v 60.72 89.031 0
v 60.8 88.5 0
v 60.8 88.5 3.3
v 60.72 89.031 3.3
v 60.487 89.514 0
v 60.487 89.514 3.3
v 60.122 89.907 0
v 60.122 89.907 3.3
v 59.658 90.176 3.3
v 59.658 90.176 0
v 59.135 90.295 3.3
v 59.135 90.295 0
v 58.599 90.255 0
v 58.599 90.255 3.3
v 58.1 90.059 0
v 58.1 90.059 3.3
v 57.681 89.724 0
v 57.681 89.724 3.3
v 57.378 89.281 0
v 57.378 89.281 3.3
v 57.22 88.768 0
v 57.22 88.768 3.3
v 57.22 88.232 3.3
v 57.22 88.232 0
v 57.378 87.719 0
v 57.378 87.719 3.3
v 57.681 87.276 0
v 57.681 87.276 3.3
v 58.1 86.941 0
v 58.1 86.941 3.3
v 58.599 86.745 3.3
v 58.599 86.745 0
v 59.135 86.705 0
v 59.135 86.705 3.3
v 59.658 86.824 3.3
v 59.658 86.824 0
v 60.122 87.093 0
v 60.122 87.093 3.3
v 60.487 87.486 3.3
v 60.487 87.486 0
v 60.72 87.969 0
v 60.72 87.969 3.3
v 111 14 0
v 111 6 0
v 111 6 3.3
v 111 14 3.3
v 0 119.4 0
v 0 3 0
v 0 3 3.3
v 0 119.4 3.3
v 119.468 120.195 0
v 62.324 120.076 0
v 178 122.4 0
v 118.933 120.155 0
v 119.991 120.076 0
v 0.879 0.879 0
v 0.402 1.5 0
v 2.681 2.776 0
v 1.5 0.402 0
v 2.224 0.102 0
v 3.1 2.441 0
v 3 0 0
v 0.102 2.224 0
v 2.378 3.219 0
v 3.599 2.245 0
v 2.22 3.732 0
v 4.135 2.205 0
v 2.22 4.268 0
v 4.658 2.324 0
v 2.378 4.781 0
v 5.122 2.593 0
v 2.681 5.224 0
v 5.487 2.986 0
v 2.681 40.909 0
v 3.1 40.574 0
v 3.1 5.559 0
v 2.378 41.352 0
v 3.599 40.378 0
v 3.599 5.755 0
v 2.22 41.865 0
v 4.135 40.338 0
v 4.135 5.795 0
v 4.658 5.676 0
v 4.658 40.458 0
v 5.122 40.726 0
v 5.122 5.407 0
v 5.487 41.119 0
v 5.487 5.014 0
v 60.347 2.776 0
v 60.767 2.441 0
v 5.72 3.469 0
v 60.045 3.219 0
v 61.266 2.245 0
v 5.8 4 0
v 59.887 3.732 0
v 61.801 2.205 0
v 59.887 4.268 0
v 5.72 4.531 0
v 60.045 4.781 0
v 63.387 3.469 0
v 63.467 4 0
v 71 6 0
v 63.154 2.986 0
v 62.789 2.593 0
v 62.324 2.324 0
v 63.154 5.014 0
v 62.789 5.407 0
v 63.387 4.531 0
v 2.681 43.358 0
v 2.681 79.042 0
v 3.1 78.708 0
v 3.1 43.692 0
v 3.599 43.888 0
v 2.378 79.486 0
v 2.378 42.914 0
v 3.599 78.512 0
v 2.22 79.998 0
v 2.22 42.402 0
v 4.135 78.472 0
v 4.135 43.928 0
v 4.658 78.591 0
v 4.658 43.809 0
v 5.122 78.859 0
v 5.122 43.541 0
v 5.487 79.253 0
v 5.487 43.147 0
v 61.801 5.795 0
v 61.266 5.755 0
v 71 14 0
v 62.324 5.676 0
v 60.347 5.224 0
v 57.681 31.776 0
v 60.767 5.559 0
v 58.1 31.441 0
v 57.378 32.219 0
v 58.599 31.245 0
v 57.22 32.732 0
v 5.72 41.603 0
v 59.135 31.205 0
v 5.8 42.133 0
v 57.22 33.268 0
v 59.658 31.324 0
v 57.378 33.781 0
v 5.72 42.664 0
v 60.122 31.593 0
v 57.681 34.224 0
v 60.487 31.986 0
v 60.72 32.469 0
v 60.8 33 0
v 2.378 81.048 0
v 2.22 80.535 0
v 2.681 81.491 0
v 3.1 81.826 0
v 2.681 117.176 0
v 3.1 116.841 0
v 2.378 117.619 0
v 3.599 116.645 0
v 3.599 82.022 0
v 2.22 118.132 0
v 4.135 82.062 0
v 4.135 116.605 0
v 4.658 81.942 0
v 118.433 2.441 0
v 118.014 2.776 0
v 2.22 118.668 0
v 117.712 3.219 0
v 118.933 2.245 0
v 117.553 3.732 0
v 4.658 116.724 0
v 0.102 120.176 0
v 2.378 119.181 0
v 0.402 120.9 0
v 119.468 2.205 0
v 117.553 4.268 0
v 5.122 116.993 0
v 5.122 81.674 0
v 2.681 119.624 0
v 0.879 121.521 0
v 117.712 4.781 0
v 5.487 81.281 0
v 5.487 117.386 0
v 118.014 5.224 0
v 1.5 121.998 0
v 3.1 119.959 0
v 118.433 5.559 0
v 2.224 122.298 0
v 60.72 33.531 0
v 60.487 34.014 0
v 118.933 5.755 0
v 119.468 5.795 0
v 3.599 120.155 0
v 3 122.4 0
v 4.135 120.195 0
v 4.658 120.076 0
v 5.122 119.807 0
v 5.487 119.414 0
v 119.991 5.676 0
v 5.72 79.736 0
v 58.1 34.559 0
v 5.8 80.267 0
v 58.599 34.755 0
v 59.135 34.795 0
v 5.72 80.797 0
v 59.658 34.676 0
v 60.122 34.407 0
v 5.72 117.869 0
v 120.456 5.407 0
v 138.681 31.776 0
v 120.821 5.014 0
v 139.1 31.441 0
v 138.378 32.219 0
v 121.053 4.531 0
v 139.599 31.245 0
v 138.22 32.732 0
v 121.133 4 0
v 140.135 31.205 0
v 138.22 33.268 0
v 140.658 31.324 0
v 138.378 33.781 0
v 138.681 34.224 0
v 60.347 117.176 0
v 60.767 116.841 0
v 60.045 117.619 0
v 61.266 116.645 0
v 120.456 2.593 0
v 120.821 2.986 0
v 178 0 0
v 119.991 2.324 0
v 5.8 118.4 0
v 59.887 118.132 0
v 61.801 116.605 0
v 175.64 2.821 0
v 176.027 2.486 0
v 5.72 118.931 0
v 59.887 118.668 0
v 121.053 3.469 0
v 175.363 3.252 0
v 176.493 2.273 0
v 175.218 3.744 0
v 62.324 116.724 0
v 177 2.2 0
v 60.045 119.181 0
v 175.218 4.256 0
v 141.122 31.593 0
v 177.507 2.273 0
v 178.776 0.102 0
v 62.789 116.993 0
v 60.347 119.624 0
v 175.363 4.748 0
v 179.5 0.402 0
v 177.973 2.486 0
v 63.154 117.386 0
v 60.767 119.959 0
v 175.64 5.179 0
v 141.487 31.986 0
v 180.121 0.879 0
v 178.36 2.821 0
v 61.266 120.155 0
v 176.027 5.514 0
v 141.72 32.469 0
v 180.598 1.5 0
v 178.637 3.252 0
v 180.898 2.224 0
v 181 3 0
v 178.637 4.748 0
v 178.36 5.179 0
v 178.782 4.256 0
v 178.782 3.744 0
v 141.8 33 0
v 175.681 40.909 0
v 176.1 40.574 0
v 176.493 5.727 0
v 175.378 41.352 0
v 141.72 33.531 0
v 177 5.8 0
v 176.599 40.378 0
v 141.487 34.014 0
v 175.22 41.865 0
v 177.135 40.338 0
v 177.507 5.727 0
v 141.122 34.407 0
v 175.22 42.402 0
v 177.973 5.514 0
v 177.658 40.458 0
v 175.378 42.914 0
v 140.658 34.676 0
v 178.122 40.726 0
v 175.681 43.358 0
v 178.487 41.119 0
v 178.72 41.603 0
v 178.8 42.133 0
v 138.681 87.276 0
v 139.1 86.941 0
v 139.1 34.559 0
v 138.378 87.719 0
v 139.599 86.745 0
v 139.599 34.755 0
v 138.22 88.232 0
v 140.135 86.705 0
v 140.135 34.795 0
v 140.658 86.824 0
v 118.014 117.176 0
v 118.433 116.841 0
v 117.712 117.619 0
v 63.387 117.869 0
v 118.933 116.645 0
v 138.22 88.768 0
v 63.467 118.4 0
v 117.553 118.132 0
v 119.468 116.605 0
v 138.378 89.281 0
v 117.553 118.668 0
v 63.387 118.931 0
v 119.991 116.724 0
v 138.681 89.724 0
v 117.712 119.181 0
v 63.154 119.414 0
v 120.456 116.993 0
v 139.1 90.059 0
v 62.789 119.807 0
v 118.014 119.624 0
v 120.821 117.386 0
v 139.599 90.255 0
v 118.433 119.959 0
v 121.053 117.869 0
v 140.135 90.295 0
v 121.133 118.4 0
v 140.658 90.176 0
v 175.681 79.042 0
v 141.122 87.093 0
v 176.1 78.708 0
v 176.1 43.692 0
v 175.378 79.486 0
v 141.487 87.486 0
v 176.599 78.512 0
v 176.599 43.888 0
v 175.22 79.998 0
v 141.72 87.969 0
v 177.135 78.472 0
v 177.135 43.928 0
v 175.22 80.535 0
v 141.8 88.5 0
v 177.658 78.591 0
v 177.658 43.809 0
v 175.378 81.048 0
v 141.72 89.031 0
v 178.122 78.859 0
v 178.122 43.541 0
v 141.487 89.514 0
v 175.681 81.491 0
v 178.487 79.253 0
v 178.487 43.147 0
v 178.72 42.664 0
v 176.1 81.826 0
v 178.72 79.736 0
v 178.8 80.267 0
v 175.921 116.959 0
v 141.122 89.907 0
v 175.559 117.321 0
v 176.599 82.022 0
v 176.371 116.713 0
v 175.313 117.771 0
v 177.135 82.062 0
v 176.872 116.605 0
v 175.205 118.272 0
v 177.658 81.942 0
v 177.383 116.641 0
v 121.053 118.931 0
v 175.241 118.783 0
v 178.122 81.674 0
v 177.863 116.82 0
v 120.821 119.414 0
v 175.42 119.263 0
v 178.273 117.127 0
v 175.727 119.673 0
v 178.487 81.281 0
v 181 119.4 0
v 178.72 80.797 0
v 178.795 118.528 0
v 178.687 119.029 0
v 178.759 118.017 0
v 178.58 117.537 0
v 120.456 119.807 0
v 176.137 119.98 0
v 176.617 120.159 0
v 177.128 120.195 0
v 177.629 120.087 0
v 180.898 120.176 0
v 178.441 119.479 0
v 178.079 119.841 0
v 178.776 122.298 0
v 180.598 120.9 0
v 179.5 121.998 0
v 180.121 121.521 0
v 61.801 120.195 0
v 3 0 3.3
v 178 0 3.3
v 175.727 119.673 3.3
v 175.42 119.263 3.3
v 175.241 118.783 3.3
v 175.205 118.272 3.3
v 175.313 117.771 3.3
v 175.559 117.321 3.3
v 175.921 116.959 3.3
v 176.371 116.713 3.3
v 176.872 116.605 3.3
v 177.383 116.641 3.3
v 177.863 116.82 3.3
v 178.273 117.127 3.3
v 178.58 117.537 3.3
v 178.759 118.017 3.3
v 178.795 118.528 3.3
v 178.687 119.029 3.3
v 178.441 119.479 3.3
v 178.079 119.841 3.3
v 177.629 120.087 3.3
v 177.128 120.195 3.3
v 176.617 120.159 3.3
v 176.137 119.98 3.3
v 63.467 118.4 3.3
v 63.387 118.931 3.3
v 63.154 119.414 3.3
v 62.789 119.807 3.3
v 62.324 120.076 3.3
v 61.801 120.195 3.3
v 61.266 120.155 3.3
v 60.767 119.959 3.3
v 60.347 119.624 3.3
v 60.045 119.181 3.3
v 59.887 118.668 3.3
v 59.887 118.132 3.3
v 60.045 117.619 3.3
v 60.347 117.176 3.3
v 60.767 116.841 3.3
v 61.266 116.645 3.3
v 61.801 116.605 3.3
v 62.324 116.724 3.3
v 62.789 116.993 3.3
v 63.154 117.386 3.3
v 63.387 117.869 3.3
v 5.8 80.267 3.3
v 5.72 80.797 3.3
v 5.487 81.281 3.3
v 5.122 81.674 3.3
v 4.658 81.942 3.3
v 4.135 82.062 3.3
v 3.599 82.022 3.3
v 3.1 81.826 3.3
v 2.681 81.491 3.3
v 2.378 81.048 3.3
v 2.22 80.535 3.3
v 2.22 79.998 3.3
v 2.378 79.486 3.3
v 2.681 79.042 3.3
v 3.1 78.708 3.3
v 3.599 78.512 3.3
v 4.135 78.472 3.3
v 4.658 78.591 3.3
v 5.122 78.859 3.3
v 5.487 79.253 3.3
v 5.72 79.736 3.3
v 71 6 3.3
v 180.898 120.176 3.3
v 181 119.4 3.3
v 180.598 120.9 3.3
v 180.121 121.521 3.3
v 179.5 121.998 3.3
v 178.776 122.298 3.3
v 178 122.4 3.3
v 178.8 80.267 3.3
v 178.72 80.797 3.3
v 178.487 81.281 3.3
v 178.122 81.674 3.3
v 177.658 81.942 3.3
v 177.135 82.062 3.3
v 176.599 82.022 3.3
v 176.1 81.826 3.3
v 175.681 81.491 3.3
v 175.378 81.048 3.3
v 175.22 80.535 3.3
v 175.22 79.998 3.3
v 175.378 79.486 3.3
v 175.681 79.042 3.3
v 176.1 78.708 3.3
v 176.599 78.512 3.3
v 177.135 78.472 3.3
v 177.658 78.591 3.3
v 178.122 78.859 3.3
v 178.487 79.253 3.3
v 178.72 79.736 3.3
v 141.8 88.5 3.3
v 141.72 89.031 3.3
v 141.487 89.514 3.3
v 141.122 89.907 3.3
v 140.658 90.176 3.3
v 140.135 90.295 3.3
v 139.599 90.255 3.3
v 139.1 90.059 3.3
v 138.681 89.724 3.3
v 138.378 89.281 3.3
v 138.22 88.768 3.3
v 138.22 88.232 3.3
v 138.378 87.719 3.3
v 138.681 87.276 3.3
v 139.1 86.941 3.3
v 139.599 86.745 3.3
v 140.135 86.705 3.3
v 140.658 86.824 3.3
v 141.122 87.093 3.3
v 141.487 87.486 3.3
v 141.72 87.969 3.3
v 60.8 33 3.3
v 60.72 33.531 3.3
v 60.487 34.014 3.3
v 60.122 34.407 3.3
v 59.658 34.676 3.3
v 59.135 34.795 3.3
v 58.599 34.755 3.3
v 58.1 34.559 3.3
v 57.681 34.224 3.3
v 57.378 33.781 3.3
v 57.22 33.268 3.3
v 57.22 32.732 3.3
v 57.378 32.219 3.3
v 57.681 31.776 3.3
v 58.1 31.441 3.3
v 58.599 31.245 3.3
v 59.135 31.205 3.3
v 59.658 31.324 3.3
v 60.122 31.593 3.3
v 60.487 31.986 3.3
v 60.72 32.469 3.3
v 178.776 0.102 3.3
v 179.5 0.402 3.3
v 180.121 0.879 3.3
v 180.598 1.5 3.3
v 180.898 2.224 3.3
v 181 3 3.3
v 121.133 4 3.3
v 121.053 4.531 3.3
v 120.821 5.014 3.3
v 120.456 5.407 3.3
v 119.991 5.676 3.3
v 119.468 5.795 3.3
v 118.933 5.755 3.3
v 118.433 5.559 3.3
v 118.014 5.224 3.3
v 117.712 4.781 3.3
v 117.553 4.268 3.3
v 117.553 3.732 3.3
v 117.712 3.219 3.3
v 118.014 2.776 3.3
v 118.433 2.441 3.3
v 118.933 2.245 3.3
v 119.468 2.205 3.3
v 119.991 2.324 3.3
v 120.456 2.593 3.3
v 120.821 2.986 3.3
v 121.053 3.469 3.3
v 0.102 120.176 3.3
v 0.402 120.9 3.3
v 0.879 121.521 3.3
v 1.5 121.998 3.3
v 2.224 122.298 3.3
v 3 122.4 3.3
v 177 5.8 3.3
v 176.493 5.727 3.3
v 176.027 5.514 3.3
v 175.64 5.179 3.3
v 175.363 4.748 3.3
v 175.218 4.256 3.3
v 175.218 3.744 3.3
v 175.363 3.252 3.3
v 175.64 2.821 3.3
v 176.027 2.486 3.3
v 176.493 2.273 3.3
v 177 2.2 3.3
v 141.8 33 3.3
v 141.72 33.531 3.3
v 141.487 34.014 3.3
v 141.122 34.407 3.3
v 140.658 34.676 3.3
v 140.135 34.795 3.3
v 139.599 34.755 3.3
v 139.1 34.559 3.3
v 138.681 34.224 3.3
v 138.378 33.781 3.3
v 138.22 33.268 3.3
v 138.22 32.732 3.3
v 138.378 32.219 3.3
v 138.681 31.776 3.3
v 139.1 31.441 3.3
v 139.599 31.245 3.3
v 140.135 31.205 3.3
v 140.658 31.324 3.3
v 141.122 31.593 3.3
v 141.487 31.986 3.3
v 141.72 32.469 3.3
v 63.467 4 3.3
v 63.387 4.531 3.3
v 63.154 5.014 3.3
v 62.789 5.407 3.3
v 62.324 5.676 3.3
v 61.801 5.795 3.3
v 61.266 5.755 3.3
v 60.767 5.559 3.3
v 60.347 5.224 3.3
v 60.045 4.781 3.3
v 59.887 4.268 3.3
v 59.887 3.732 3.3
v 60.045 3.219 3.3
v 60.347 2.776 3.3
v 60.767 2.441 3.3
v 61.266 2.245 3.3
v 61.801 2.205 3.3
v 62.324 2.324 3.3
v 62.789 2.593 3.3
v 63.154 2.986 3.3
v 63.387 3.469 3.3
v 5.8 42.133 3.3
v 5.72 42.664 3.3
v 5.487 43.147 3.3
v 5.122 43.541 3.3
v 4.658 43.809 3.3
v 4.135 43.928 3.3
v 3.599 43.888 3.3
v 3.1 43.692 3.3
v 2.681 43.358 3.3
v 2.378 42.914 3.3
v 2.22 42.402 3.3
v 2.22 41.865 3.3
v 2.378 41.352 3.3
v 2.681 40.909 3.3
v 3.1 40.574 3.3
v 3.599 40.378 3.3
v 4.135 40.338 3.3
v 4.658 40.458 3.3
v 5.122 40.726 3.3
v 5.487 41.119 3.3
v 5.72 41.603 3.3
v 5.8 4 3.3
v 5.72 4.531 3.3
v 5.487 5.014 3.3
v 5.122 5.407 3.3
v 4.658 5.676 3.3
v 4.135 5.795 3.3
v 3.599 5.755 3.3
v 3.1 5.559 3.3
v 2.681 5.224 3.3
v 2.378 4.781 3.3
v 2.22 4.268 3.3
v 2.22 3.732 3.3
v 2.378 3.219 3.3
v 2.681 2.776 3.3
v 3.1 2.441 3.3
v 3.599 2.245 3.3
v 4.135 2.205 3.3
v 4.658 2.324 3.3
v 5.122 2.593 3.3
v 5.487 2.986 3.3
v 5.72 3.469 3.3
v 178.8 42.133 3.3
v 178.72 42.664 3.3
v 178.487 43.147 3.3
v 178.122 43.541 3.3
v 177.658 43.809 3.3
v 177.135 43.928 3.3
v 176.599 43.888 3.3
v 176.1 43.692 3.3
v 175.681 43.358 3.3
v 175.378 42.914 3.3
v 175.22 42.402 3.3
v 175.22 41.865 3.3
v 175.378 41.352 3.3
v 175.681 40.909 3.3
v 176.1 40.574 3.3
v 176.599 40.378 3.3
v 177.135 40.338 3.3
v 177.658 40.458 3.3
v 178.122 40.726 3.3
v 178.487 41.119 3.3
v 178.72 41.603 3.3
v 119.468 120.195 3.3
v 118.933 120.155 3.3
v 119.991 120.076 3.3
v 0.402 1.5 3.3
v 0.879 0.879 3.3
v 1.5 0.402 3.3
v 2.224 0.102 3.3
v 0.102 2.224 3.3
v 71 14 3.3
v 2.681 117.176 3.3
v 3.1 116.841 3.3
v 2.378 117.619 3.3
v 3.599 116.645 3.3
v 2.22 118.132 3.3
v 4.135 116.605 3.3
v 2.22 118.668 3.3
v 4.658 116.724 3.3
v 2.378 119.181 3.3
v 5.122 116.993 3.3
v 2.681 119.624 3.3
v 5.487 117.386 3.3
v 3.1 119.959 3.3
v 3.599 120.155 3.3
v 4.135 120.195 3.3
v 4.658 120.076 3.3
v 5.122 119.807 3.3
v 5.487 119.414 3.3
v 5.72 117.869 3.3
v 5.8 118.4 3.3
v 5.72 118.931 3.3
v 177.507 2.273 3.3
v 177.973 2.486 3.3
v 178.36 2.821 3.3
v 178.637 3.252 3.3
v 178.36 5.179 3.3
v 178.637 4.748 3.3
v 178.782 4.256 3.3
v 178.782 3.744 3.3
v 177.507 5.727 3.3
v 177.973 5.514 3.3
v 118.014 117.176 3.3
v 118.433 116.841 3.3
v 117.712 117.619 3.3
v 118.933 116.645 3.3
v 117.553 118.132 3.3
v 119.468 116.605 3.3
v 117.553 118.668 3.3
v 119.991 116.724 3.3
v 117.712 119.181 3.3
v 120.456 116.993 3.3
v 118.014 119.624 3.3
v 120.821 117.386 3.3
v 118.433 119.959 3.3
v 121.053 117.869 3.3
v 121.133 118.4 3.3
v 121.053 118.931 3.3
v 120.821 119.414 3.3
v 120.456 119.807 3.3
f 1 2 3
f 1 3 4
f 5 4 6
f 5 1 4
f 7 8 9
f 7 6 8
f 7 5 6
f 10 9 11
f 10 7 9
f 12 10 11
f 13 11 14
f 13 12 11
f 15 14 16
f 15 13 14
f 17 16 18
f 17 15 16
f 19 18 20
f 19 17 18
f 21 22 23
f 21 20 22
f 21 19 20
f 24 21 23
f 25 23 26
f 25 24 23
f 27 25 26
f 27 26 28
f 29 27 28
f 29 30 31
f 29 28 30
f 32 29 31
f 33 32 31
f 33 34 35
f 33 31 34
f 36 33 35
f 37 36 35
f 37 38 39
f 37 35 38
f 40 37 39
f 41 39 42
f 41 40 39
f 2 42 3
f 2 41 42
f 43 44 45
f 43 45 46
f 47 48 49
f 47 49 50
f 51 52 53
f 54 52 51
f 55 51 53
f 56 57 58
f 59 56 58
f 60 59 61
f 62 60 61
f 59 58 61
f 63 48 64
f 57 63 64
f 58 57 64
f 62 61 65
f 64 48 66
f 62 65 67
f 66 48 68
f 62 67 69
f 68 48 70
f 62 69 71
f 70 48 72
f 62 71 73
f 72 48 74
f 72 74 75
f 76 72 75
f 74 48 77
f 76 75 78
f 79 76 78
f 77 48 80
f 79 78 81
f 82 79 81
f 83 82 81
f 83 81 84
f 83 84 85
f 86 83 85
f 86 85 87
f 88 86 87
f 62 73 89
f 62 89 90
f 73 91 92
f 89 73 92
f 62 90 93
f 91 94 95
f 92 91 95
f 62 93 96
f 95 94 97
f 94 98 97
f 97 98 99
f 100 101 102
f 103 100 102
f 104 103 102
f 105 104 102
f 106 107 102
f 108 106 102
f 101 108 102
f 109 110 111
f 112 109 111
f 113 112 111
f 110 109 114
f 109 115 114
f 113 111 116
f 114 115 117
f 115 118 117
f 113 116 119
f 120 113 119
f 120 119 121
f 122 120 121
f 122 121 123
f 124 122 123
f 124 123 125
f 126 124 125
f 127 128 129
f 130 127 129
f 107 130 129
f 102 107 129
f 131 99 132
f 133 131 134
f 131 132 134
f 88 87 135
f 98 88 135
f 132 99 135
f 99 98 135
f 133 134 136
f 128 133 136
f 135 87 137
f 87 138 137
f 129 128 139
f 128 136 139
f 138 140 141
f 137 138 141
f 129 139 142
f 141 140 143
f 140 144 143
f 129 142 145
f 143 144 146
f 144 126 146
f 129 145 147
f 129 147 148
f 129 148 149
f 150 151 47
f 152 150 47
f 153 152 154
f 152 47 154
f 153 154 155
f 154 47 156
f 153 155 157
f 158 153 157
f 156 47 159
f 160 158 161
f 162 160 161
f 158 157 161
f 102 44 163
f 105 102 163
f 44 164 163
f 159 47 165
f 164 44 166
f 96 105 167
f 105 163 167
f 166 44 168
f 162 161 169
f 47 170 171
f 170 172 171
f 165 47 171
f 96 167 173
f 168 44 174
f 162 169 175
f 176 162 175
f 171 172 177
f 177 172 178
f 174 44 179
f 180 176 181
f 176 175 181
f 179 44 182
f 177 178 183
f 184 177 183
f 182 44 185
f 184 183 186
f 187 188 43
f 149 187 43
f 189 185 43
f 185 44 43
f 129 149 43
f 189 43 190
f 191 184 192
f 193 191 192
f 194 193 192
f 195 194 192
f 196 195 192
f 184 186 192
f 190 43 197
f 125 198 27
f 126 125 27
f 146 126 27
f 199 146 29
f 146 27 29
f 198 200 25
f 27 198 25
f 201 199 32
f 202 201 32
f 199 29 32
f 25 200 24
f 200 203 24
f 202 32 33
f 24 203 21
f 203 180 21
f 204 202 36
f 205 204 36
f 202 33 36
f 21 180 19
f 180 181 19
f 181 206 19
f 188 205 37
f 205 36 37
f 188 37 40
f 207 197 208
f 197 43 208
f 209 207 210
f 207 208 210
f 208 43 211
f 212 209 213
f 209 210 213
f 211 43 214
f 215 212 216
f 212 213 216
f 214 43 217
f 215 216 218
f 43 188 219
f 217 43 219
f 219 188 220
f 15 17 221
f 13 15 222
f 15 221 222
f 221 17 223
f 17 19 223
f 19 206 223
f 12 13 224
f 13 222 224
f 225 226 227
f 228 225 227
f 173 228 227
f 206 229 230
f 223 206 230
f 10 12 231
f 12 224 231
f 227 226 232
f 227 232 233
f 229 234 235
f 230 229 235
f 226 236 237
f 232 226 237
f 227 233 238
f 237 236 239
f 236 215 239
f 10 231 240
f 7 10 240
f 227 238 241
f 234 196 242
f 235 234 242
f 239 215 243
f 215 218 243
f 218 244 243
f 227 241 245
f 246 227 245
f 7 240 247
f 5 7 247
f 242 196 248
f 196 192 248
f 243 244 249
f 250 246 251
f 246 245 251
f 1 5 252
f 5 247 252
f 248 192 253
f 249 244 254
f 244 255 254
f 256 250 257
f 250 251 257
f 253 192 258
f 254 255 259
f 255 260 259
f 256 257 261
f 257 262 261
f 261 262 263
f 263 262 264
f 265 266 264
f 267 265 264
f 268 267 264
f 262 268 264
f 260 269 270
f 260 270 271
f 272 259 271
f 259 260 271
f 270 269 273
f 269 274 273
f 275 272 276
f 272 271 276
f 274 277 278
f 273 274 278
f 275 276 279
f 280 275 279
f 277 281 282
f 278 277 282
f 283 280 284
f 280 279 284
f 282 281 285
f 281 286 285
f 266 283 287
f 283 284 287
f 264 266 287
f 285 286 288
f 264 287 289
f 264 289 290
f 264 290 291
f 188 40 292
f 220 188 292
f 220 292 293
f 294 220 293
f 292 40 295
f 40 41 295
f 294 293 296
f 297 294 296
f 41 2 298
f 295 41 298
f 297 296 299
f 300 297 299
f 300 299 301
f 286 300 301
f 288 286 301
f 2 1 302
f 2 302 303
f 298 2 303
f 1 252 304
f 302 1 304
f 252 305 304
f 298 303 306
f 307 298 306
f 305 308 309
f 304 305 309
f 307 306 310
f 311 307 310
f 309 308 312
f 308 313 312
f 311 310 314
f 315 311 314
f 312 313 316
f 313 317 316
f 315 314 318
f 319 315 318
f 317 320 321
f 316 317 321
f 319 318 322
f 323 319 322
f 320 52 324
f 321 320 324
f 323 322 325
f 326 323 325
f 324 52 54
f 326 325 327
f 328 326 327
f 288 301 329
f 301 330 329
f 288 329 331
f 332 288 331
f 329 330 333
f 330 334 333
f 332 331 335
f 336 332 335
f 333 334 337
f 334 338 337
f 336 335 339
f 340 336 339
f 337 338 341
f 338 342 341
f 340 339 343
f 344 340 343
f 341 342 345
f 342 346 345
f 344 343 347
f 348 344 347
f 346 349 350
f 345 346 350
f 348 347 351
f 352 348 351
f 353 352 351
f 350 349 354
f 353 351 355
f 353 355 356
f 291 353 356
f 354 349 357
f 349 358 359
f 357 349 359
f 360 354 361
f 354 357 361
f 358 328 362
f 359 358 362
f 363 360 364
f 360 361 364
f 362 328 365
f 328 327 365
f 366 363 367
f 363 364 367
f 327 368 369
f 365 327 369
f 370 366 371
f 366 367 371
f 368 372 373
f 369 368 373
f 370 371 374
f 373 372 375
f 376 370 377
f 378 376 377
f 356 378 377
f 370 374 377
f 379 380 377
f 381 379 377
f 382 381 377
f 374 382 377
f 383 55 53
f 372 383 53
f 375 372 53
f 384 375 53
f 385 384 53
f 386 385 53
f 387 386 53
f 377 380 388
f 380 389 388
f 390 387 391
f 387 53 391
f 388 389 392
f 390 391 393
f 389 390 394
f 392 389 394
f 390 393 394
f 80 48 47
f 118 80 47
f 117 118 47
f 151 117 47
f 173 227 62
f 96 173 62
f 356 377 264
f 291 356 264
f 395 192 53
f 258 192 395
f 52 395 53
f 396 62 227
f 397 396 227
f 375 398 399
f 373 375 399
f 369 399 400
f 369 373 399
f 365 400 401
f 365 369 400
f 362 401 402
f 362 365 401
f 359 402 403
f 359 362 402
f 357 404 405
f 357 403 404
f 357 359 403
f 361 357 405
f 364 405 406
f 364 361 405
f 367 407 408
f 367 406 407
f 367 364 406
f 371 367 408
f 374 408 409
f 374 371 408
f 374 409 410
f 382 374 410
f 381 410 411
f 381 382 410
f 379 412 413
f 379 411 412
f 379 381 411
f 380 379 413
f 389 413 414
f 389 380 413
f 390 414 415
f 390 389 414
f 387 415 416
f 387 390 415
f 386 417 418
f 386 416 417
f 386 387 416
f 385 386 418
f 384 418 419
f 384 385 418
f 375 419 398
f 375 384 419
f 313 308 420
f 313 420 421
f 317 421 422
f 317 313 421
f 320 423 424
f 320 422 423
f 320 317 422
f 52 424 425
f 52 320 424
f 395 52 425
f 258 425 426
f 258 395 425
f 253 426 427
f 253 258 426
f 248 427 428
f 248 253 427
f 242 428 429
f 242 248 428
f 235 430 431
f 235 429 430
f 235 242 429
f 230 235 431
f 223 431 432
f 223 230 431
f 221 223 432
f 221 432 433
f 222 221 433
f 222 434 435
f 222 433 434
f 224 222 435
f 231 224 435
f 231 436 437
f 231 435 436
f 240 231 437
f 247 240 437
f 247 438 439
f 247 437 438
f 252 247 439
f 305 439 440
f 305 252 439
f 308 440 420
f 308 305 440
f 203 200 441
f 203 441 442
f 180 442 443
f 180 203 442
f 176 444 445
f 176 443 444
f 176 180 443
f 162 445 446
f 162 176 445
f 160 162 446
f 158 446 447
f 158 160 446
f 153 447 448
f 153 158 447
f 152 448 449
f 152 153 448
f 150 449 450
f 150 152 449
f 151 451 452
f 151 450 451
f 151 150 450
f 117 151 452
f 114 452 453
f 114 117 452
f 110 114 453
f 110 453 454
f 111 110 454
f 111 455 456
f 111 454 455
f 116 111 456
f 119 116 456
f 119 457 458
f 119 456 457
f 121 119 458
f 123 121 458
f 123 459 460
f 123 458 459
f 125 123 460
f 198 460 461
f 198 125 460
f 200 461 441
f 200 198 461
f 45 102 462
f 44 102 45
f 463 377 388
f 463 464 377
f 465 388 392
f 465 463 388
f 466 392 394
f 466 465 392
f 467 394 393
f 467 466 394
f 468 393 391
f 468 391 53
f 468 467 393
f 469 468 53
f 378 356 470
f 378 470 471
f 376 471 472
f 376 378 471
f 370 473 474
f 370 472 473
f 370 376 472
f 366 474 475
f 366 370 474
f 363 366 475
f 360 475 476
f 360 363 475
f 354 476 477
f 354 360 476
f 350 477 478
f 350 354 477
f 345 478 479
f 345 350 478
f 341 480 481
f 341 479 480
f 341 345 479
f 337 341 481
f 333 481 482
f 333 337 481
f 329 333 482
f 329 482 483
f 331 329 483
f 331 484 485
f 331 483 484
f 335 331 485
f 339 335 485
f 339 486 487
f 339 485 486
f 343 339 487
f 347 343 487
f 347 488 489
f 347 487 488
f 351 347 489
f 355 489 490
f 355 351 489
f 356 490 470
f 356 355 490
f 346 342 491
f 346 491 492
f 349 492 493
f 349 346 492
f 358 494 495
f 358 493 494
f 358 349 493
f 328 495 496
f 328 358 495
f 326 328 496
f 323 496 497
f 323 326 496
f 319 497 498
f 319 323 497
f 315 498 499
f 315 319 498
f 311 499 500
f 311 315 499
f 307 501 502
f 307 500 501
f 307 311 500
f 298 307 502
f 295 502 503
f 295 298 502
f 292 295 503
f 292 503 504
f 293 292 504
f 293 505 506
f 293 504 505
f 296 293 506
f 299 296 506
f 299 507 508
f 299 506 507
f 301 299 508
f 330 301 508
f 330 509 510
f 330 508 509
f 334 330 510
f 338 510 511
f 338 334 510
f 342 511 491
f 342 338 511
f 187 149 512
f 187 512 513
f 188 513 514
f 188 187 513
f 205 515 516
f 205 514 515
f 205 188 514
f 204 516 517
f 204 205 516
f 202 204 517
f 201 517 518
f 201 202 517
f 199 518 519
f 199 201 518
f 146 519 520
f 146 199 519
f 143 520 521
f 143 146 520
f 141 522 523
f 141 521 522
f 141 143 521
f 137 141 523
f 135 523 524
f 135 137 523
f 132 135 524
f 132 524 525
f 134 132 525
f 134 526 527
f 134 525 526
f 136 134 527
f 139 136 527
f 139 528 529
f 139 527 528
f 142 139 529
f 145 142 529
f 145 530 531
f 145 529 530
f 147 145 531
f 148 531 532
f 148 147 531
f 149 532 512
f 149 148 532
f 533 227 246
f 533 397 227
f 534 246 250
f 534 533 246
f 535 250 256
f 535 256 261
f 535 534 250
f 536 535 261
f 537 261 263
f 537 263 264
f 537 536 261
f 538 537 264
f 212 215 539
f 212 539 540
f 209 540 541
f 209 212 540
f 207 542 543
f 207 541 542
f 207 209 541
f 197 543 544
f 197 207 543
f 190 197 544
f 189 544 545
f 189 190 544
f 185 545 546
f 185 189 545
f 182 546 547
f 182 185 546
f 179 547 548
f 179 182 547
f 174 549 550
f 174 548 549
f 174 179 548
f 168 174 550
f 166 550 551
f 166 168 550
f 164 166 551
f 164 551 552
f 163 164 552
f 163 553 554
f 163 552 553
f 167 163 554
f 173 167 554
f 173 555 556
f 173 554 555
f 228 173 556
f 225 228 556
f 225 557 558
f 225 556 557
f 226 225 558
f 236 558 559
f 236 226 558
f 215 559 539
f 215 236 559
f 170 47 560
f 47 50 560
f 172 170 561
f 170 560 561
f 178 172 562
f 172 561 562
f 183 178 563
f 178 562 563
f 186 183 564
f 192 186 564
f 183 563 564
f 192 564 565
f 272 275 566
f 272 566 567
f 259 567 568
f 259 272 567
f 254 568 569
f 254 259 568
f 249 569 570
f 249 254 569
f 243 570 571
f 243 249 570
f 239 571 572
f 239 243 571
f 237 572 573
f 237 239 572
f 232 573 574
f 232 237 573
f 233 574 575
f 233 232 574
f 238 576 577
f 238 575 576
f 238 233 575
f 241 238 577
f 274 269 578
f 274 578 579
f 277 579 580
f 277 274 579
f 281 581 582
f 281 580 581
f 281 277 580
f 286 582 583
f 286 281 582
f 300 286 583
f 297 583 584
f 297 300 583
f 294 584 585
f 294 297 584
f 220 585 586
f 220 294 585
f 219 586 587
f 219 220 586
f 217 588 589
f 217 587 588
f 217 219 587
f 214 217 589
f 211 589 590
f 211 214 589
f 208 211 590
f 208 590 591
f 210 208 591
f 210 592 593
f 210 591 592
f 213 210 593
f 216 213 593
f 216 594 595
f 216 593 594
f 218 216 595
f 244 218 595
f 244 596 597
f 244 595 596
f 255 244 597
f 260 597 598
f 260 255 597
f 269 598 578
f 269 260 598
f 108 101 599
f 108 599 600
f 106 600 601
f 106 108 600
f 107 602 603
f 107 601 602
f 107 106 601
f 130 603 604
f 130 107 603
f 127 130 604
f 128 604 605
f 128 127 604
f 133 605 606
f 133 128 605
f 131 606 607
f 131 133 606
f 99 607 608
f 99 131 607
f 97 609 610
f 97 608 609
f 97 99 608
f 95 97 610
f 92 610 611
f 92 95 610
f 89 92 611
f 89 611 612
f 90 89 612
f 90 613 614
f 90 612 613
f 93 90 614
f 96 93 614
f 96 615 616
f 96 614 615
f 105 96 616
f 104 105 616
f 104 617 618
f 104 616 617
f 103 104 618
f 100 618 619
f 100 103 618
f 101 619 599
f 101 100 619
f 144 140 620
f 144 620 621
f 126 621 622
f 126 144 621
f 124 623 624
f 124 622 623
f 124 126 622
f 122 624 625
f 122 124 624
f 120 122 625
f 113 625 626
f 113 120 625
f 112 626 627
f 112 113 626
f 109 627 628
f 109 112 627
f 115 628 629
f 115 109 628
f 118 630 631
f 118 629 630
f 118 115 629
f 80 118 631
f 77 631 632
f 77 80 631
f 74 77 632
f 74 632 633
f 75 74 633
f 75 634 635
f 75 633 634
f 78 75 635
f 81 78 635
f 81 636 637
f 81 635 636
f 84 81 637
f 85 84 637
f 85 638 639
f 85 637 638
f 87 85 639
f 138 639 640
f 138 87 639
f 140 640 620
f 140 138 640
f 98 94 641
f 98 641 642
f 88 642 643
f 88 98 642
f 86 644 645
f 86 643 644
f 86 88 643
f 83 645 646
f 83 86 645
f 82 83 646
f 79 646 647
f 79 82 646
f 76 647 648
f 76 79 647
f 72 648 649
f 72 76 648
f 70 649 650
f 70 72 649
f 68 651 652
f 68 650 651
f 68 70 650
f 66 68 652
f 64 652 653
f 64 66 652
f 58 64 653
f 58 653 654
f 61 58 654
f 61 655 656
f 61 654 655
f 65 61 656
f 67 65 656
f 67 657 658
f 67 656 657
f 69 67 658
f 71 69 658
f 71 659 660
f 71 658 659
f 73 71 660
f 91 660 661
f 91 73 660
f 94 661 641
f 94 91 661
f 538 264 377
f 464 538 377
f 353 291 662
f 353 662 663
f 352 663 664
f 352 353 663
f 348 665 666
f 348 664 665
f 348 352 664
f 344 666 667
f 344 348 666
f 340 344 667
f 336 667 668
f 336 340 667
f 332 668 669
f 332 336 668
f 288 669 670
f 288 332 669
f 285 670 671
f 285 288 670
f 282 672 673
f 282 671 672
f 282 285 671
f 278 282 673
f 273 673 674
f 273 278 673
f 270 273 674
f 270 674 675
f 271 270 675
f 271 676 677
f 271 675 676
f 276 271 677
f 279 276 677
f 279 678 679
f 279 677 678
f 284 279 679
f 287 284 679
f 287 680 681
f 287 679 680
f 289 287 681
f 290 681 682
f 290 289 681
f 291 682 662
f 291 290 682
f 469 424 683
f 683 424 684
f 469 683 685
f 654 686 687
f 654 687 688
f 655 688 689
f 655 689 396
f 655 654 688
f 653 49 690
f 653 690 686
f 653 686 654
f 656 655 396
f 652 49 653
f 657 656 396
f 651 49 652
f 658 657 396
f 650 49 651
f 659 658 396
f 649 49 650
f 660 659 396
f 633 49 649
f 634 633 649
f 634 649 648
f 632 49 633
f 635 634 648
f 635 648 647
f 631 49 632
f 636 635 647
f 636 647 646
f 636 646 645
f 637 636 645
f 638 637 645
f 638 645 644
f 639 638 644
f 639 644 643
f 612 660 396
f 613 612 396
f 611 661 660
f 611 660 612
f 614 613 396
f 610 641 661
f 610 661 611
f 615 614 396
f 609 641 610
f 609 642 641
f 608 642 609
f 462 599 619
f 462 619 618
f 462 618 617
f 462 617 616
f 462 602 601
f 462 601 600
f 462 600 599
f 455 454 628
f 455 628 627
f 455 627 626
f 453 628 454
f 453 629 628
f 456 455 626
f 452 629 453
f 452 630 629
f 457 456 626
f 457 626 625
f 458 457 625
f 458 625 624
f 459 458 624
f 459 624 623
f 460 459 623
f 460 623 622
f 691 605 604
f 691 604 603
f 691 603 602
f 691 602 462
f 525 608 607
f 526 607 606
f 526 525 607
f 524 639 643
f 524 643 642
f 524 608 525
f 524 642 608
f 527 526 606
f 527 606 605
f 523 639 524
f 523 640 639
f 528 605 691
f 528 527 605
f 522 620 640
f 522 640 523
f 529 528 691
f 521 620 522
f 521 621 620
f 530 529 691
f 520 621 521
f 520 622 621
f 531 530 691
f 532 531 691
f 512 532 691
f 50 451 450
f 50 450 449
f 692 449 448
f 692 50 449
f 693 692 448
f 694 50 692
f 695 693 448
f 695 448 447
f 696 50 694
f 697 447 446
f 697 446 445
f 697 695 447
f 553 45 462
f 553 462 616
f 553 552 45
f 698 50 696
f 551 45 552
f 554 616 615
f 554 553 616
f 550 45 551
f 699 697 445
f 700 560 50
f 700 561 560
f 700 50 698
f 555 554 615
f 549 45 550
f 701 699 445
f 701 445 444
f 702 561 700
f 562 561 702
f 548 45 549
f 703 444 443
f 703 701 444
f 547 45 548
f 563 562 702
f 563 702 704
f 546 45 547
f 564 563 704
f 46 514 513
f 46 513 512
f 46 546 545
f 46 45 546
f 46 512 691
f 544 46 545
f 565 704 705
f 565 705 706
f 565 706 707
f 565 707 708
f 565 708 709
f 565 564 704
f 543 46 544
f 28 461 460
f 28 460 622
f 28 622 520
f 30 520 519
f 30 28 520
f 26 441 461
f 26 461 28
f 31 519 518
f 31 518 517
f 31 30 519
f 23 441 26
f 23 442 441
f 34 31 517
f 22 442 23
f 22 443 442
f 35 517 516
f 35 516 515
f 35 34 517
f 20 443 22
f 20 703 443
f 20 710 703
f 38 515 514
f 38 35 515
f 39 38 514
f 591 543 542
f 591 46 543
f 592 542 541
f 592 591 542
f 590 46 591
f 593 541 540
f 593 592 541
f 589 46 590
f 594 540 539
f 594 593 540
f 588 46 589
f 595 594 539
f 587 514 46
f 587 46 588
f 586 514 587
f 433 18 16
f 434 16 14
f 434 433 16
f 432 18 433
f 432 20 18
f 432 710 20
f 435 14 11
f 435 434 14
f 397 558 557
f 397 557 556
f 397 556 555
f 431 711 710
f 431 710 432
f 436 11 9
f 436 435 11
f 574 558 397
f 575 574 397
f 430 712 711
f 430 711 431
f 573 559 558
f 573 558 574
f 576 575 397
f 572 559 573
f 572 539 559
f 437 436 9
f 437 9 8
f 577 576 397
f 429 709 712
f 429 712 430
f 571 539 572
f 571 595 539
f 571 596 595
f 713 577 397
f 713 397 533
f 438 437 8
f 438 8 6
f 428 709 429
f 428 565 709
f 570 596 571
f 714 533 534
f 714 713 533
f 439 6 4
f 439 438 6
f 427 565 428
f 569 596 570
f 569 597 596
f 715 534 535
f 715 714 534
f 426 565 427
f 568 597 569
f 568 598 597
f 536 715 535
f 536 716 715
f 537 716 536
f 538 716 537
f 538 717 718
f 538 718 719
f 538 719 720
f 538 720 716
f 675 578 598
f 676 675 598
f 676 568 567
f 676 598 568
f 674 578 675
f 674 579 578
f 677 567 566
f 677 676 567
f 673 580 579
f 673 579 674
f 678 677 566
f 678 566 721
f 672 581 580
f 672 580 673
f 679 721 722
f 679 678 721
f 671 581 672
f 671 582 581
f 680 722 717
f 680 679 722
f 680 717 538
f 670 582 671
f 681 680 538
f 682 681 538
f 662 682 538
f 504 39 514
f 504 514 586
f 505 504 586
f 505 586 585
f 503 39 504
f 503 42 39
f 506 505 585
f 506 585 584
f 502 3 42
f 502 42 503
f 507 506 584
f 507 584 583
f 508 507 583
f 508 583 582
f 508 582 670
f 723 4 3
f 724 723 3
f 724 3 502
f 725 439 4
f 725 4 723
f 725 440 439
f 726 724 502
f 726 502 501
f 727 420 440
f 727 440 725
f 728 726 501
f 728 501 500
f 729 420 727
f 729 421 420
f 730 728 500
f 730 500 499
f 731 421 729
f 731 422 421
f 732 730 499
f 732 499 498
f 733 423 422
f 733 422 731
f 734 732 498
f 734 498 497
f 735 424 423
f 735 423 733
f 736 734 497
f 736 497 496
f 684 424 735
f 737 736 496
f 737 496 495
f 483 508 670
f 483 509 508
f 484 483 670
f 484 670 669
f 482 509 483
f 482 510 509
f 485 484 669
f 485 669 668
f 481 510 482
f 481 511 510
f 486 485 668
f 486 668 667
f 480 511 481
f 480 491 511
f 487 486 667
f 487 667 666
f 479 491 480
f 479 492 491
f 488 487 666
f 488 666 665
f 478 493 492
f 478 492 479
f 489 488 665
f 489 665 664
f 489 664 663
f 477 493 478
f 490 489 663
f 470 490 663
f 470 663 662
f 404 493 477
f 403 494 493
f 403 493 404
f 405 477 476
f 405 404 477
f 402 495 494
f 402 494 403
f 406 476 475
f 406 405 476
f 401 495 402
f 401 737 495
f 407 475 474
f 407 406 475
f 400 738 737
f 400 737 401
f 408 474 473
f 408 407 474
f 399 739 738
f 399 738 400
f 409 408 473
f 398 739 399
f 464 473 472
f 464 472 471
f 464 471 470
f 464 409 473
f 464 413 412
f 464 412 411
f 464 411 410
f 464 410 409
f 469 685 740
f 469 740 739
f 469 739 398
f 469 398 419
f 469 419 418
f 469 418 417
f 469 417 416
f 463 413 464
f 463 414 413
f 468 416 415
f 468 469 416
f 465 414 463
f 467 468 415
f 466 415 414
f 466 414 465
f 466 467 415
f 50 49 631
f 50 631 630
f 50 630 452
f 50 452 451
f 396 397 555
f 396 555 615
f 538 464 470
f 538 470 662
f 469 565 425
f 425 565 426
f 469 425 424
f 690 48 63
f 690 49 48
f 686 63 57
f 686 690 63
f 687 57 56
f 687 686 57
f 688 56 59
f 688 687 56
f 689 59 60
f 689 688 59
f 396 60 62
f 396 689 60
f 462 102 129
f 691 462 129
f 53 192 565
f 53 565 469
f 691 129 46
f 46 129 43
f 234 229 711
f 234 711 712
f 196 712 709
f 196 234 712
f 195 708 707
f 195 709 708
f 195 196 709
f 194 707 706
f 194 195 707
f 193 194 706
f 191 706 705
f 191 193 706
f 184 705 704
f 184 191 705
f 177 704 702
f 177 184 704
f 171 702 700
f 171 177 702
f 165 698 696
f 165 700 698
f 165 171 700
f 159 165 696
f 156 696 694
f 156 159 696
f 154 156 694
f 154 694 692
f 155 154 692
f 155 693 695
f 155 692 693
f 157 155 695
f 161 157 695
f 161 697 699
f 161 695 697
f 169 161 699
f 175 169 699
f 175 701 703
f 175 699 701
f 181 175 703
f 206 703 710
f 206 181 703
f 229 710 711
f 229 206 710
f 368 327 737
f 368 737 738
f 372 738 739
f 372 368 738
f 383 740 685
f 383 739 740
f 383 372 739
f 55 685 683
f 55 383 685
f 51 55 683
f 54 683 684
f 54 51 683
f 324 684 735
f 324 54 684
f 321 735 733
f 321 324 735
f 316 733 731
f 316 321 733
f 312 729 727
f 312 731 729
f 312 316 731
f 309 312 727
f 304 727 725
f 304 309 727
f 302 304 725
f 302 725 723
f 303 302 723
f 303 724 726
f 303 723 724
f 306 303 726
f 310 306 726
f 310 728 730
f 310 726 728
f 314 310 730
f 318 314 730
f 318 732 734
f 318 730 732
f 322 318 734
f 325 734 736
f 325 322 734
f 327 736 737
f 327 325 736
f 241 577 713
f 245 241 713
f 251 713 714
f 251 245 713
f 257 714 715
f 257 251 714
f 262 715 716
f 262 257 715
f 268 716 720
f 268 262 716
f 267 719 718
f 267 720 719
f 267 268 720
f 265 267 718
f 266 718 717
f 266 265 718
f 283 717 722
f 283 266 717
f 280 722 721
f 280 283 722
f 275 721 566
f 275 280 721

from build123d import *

# Parameters (mm, degrees)
CYLINDER004_R     = 1.8
CYLINDER004_DEPTH = 20
ARRAY007_X_COUNT  = 2
ARRAY007_X_PITCH  = 81
ARRAY007_Y_COUNT  = 2
ARRAY007_Y_PITCH  = 55.5
CYLINDER003_R     = 1.8
CYLINDER003_DEPTH = 30
ARRAY004_X_COUNT  = 4
ARRAY004_X_PITCH  = 57.666667
ARRAY005_Y_COUNT  = 2
ARRAY005_Y_PITCH  = 114.4
ARRAY002_Y_COUNT  = 4
ARRAY002_Y_PITCH  = 38.133333
ARRAY003_X_COUNT  = 2
ARRAY003_X_PITCH  = 173
BOX019_W          = 40
BOX019_H          = 8
BOX019_DEPTH      = 10
BOX018_W          = 181
BOX018_H          = 122.4
BOX018_DEPTH      = 3.3
FILLET001_R       = 3


with BuildPart() as array007:
    # Cylinder004 → Cylinder004 (new body)
    with BuildSketch(Plane(origin=(59, 33, -7), x_dir=(1, 0, 0), z_dir=(0, 0, 1))):
        Circle(CYLINDER004_R)
    extrude(amount=CYLINDER004_DEPTH)

    # Array007 X: Array007 ×2


with BuildPart() as array007_1:
    add(array007.part)
    with Locations(*[(i * ARRAY007_X_PITCH, 0, 0) for i in range(1, ARRAY007_X_COUNT)]):
        add(array007.part)

    # Array007 Y: Array007 ×2


with BuildPart() as array007_2:
    add(array007_1.part)
    with Locations(*[(0, i * ARRAY007_Y_PITCH, 0) for i in range(1, ARRAY007_Y_COUNT)]):
        add(array007_1.part)


with BuildPart() as cylinder003:
    # Cylinder003 → Cylinder003 (new body)
    with BuildSketch(Plane(origin=(4, 4, 1), x_dir=(1, 0, 0), z_dir=(0, 0, 1))):
        Circle(CYLINDER003_R)
    extrude(amount=CYLINDER003_DEPTH)


with BuildPart() as array005:
    # Array004 base: copy of Cylinder003
    add(cylinder003.part)

    # Array004 X: Array005 ×4


with BuildPart() as array005_1:
    add(array005.part)
    with Locations(*[(i * ARRAY004_X_PITCH, 0, 0) for i in range(1, ARRAY004_X_COUNT)]):
        add(array005.part)

    # Array005 Y: Array005 ×2


with BuildPart() as array005_2:
    add(array005_1.part)
    with Locations(*[(0, i * ARRAY005_Y_PITCH, 0) for i in range(1, ARRAY005_Y_COUNT)]):
        add(array005_1.part)


with BuildPart() as side_wider_holes_clone:
    # Array002 base: copy of Cylinder003
    add(cylinder003.part)

    # Array002 Y: side wider holes clone ×4


with BuildPart() as side_wider_holes_clone_1:
    add(side_wider_holes_clone.part)
    with Locations(*[(0, i * ARRAY002_Y_PITCH, 0) for i in range(1, ARRAY002_Y_COUNT)]):
        add(side_wider_holes_clone.part)

    # Array003 X: side wider holes clone ×2


with BuildPart() as side_wider_holes_clone_2:
    add(side_wider_holes_clone_1.part)
    with Locations(*[(i * ARRAY003_X_PITCH, 0, 0) for i in range(1, ARRAY003_X_COUNT)]):
        add(side_wider_holes_clone_1.part)

    # Fusion009: union Array005
    add(array005_2.part)


with BuildPart() as side_wider_holes_clone_3:
    # Body024 placement: moved
    add(side_wider_holes_clone_2.part.moved(Location((0, 0, -8))))


with BuildPart() as fusion006:
    # Box019 → Box019 (new body)
    with BuildSketch(Plane(origin=(71, 6, -2), x_dir=(1, 0, 0), z_dir=(0, 0, 1))):
        with Locations((20, 4)):
            Rectangle(BOX019_W, BOX019_H)
    extrude(amount=BOX019_DEPTH)

    # Fusion006: union Array007, side wider holes clone
    add(array007_2.part)
    add(side_wider_holes_clone_3.part)


with BuildPart() as display_back_cut:
    # Box018 → Box018 (new body)
    with BuildSketch(Plane.XY):
        with Locations((90.5, 61.2)):
            Rectangle(BOX018_W, BOX018_H)
    extrude(amount=BOX018_DEPTH)

    # Fillet001
    fillet001_edges = [display_back_cut.edges().sort_by_distance(p)[0] for p in [
        (0, 0, 1.65),
        (0, 122.4, 1.65),
        (181, 0, 1.65),
        (181, 122.4, 1.65),
    ]]
    fillet(fillet001_edges, radius=FILLET001_R)

    # Cut003: cut Fusion006
    add(fusion006.part, mode=Mode.SUBTRACT)


solid = display_back_cut.part
